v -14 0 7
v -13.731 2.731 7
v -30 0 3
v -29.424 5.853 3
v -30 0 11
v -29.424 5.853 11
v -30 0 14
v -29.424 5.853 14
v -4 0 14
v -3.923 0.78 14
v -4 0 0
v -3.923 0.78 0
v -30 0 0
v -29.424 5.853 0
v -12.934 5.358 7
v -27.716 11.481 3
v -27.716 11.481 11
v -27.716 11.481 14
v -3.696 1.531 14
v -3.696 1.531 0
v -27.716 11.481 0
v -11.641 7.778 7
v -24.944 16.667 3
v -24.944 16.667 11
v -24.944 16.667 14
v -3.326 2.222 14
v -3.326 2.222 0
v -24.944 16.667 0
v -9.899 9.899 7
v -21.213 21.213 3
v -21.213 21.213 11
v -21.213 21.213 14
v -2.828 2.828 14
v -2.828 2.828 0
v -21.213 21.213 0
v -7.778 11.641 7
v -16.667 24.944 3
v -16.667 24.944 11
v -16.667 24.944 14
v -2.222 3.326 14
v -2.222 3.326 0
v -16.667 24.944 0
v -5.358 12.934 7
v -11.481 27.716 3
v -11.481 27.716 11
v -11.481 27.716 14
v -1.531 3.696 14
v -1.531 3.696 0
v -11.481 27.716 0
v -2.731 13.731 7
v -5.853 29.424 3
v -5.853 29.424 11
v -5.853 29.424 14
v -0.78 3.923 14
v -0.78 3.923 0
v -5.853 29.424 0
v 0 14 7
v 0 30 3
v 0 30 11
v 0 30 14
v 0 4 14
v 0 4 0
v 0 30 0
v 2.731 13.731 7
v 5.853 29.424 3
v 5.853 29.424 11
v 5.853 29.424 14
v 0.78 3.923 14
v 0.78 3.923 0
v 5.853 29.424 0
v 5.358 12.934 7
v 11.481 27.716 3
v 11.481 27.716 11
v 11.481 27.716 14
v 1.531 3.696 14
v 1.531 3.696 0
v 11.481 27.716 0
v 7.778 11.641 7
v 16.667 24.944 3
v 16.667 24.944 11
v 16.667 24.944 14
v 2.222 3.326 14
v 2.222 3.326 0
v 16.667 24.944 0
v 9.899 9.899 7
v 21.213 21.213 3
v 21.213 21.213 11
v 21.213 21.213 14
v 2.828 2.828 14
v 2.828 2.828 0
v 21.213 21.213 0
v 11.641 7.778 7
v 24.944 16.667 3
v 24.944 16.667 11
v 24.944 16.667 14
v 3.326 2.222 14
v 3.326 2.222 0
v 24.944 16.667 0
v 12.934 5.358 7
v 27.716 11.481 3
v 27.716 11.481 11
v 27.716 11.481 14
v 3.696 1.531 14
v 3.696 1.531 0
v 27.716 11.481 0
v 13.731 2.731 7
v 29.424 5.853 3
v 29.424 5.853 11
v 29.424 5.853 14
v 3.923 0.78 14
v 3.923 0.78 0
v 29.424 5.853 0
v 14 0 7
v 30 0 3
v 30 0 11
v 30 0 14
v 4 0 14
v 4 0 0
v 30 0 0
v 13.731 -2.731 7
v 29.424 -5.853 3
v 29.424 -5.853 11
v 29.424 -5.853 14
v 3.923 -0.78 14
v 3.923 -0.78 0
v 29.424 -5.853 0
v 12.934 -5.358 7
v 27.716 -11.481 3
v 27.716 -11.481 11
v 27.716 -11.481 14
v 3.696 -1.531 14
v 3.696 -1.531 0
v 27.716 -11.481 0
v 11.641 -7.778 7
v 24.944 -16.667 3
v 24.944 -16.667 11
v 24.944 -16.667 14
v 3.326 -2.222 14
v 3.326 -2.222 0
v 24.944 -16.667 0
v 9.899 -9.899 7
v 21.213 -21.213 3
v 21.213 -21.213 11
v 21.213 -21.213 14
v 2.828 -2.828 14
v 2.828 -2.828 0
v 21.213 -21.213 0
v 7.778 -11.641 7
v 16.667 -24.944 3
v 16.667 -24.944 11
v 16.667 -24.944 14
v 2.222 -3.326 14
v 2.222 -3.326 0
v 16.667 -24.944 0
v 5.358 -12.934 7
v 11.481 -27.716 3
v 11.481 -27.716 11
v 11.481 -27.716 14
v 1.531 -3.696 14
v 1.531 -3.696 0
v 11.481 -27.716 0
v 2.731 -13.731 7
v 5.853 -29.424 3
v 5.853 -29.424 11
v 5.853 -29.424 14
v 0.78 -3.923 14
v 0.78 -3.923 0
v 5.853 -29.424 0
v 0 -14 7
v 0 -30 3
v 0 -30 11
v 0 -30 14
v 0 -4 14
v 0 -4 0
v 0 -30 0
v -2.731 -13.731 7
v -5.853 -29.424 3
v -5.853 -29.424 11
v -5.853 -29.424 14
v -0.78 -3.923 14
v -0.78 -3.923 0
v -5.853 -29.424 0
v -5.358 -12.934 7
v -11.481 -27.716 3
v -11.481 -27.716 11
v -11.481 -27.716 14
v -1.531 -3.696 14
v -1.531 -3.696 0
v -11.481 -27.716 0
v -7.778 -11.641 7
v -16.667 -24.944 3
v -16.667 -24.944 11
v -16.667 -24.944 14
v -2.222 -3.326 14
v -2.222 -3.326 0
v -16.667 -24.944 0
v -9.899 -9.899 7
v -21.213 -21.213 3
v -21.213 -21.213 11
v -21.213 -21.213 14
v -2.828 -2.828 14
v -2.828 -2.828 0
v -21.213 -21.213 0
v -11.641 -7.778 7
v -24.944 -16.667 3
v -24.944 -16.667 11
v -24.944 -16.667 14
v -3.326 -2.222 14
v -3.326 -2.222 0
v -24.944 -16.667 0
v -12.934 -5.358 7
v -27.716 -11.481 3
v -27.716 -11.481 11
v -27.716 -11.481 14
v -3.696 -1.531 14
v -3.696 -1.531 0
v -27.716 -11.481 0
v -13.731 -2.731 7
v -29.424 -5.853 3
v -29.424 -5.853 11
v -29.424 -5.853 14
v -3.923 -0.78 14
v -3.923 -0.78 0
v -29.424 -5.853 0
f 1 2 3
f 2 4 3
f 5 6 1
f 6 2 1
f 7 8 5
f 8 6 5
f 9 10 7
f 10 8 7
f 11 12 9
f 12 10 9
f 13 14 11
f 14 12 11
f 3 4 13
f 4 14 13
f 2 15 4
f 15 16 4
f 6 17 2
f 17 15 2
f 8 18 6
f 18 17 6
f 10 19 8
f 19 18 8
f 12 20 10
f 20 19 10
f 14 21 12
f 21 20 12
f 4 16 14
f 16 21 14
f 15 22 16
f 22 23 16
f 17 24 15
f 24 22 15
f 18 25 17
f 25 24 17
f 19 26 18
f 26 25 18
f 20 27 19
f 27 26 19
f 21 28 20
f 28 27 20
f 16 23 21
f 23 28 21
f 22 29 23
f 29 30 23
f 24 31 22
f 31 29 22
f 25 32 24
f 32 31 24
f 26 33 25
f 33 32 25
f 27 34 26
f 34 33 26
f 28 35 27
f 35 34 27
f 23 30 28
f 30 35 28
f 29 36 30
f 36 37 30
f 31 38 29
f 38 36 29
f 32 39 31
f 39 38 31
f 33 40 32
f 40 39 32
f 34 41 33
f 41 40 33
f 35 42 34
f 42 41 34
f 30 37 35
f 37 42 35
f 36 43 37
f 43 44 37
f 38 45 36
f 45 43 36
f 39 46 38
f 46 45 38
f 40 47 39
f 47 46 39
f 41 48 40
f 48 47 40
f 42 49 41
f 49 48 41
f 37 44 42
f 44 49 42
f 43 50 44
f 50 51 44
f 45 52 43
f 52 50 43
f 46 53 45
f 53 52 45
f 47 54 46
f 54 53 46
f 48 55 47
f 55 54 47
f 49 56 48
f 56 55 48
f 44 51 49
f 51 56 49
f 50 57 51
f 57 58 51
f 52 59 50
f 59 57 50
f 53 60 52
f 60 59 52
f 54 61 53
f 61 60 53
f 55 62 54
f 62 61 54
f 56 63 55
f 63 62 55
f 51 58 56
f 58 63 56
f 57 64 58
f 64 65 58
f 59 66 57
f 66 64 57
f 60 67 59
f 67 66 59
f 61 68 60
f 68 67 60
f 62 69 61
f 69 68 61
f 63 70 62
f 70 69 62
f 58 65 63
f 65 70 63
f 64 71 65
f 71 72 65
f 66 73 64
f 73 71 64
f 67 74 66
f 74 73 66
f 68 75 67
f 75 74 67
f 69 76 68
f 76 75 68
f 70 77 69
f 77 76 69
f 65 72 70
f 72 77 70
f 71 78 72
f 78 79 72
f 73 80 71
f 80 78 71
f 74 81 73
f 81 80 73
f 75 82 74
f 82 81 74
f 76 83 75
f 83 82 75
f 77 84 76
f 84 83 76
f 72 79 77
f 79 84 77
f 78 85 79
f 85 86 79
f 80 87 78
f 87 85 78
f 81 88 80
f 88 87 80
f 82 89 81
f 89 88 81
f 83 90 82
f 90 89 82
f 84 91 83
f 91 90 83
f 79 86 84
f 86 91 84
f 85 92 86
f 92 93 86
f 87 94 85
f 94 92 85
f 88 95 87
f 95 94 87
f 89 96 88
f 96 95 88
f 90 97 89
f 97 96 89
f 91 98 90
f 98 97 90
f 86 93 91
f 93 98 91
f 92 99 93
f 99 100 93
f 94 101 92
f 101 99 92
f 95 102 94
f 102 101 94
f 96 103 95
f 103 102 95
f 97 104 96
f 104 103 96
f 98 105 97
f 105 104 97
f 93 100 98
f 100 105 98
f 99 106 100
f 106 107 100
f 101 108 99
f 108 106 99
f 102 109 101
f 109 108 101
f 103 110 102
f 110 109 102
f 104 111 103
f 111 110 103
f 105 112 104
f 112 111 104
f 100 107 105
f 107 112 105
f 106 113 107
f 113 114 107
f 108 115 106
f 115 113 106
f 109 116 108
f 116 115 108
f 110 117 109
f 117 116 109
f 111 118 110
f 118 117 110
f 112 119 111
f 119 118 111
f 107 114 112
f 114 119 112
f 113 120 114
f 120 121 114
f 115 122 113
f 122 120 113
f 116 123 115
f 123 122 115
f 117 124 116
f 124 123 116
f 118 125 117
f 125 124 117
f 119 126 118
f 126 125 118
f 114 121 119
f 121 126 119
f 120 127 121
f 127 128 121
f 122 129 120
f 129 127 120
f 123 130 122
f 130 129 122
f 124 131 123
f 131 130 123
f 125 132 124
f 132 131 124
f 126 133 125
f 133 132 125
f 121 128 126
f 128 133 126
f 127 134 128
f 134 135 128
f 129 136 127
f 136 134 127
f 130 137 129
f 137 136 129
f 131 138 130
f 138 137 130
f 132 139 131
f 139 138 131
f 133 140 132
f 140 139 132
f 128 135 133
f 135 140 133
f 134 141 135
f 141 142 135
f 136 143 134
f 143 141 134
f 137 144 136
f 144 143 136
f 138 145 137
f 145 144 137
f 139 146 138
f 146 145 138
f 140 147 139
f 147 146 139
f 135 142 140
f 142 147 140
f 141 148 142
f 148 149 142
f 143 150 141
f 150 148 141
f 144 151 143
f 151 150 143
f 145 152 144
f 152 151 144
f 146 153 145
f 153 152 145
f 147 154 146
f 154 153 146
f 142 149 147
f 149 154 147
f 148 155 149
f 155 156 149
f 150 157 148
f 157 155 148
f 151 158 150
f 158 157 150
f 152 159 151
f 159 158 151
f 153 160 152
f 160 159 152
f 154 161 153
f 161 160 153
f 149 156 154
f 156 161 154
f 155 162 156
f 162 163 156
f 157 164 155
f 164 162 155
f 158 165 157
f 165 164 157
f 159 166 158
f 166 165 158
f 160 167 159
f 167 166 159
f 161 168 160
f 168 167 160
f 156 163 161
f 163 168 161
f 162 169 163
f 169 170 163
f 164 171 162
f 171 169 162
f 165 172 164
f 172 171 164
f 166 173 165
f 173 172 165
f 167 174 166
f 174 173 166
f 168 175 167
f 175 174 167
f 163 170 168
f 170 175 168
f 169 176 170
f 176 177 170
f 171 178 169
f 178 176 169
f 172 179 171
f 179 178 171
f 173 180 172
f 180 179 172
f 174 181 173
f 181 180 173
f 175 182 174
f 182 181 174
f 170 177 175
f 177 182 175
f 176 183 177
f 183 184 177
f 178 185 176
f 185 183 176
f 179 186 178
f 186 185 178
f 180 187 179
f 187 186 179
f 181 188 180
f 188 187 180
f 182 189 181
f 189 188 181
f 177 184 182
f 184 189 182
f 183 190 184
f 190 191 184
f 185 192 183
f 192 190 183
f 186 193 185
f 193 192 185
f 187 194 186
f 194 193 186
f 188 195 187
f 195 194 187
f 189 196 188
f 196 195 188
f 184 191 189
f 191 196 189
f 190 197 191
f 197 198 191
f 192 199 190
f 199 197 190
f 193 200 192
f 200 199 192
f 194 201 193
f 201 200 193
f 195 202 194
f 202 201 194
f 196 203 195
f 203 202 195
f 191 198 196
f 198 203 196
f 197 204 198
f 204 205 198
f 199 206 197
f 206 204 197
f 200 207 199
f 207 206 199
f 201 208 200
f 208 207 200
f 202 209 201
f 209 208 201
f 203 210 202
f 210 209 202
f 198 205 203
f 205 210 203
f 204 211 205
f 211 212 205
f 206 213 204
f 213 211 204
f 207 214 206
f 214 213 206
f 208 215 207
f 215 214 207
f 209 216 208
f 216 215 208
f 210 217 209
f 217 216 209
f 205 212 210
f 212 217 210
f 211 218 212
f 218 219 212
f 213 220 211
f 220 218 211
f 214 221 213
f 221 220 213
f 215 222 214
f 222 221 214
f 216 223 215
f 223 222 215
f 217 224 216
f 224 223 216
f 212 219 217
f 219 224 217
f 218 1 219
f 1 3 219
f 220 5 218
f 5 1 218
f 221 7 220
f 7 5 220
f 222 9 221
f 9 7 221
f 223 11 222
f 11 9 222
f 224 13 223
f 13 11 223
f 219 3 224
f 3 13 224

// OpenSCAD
$fn = 32;

// ----------------------------------------------------------------------
// Revolved part: V-groove pulley R30
// ----------------------------------------------------------------------

// --- parameters (mm) ---
bore_r = 4;               // bore radius
rim_r = 30;               // rim radius
rim_t = 14;               // rim width
groove_r = 14;            // groove root radius
groove_w = 4;             // groove half width
revolve_angle = 360;      // revolve sweep, degrees

bore_d = 2 * bore_r;
rim_d = 2 * rim_r;
groove_d = 2 * groove_r;

profile = [[4, 0], [30, 0], [30, 3], [14, 7], [30, 11], [30, 14], [4, 14]];  // primary outline, 7 points, counter clockwise

// --- the one profile operation ---
rotate_extrude(angle = revolve_angle) polygon(points = profile);
